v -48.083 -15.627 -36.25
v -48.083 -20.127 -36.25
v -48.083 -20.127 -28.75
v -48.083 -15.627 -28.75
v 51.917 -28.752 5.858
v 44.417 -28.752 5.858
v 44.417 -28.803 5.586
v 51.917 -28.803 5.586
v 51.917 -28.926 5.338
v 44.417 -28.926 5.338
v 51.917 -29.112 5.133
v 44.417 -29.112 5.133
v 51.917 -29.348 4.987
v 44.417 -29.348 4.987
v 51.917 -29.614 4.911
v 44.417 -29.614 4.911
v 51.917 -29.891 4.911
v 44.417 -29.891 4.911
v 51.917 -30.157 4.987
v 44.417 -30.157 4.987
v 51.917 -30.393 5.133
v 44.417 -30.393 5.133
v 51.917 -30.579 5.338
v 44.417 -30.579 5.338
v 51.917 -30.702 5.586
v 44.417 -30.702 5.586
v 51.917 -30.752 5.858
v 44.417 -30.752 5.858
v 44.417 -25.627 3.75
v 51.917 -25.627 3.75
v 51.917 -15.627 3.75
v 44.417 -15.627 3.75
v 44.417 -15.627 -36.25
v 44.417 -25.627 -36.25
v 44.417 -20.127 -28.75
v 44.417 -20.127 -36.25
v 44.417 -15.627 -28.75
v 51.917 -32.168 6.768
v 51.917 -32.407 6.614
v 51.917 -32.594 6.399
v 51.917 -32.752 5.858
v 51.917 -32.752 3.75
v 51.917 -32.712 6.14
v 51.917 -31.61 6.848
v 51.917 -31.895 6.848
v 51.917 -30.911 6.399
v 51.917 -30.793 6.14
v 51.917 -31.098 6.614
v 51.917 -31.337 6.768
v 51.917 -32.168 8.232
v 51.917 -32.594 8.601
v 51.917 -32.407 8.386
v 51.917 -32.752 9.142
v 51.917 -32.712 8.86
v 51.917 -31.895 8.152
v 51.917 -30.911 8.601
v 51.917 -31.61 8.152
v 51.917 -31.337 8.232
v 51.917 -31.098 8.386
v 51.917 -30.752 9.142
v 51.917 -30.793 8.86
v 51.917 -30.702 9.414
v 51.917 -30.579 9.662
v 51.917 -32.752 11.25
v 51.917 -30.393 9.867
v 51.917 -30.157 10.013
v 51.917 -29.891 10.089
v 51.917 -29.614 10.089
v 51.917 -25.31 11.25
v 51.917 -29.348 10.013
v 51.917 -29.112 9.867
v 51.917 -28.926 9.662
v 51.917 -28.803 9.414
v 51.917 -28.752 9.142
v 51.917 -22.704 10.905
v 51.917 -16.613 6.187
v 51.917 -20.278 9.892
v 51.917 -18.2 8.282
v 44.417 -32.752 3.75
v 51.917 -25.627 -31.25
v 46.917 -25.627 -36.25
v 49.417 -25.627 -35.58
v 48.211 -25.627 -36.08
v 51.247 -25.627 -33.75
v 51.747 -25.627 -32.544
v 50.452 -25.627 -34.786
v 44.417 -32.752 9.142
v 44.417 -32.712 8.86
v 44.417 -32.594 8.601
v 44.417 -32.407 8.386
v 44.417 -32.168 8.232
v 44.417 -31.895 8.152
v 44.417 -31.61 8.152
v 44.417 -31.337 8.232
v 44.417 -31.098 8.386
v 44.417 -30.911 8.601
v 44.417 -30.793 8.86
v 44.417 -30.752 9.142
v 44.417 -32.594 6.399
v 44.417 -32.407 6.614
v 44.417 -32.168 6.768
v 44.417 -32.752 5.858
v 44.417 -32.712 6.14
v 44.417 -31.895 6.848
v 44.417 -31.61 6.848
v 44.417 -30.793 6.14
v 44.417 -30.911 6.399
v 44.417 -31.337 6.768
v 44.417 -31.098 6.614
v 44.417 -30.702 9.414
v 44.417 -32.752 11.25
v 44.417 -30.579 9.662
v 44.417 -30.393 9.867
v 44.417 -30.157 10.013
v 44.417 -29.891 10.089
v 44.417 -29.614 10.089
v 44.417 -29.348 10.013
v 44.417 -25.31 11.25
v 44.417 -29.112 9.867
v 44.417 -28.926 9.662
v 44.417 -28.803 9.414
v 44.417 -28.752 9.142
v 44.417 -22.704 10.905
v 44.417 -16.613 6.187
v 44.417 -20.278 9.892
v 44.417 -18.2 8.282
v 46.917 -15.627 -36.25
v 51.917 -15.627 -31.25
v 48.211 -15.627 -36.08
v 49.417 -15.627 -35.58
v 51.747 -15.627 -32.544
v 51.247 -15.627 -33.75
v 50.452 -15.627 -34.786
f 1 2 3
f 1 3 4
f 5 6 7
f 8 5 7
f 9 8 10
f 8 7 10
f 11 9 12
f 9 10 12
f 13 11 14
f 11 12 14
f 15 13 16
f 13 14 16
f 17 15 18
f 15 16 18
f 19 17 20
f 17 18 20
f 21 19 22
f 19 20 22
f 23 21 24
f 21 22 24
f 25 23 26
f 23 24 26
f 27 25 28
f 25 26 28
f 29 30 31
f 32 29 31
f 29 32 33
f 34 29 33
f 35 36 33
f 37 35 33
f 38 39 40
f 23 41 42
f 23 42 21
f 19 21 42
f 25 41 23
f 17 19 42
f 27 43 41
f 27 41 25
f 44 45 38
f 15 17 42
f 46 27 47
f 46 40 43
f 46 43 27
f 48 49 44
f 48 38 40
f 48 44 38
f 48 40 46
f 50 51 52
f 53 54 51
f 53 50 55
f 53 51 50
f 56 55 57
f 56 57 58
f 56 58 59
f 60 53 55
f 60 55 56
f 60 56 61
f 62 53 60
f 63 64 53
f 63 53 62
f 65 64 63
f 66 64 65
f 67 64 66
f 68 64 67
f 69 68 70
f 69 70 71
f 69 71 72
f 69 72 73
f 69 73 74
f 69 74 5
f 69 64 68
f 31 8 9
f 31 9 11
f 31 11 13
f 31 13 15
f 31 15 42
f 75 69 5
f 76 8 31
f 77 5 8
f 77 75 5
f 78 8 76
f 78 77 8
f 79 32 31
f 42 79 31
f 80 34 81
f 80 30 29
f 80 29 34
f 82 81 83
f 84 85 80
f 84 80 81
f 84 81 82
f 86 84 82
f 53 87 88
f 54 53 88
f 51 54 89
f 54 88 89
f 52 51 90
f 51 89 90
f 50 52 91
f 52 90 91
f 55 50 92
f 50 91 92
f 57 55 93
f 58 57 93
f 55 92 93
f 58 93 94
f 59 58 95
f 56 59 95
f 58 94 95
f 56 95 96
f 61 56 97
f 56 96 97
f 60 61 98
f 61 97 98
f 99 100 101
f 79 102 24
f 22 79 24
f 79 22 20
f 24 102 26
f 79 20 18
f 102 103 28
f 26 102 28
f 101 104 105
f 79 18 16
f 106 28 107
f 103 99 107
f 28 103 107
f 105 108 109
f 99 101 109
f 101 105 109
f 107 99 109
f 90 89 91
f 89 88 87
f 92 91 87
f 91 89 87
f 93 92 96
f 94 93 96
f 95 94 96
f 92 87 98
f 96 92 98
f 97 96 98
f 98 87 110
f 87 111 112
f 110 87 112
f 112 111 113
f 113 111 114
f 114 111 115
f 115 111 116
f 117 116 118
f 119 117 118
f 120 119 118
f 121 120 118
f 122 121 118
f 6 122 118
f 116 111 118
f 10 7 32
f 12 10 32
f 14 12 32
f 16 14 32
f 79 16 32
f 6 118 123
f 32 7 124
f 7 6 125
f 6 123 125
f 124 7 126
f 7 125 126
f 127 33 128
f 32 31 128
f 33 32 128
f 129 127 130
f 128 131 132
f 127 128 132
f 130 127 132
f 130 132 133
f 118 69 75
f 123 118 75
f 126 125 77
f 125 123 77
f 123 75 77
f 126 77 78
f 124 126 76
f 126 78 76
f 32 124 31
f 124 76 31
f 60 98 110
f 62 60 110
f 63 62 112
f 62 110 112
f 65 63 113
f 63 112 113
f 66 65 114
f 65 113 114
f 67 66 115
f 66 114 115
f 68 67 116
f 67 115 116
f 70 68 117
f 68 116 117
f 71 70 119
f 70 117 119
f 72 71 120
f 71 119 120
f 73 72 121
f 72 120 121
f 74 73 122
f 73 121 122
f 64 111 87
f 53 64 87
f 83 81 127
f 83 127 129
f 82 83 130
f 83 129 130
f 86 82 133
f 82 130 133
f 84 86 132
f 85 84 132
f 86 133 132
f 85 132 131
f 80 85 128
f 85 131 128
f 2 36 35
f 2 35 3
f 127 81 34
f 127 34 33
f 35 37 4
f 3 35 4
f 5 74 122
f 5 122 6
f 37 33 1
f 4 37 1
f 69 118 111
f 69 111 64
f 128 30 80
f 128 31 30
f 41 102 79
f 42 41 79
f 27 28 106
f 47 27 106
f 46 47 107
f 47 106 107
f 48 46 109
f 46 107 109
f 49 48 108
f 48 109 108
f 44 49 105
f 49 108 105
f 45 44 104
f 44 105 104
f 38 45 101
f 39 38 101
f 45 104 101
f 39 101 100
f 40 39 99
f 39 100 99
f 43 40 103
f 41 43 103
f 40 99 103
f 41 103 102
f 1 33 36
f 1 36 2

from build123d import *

# Parameters (mm, degrees)
PUSHER_BASE_DEPTH   = 15
SKETCH3_R           = 1.95
SCREW_HOLE_DEPTH    = 7.5
SKETCH6_W           = 7.5
SKETCH6_H           = 30.25
PUSHER_HEAD_DEPTH   = 3.75
FILLET1_R           = 2
CUT_EXTRUDE1_DEPTH  = 7.5
SKETCH9_W           = 40
SKETCH9_H           = 10
BOSS_EXTRUDE1_DEPTH = 7.5
SKETCH10_W          = 92.5
SKETCH10_H          = 4.5
BOSS_EXTRUDE2_DEPTH = 7.5
FILLET7_R           = 10
FILLET8_R           = 5
SKETCH13_W          = 41.9274774
SKETCH13_H          = 25.253149212
CUT_EXTRUDE2_DEPTH  = 26


with BuildPart() as part:
    # Sketch1 → pusher base (new body)
    with BuildSketch(Plane.XY):
        Polygon((59.166899441, -45.877477752), (51.666899441, -45.877477752), (44.666899441, -45.877477752), (37.166899441, -45.877477752), (37.166899441, -69.377477752), (41.916899441, -69.377477752), (41.916899441, -64.127477752), (54.416899441, -64.127477752), (54.416899441, -69.377477752), (59.166899441, -69.377477752), align=None)
        with BuildLine():
            Line((48.279417247, -51.877477752), (48.054381634, -51.877477752))
            ThreePointArc((48.054381634, -51.877477752), (39.166899441, -50.877477752), (48.054381634, -49.877477752))
            Line((48.054381634, -49.877477752), (48.279417247, -49.877477752))
            ThreePointArc((48.279417247, -49.877477752), (57.166899441, -50.877477752), (48.279417247, -51.877477752))
        make_face(mode=Mode.SUBTRACT)
    extrude(amount=PUSHER_BASE_DEPTH)

    # Sketch3 → screw hole (cut)
    with BuildSketch(Plane.XZ.offset(64.127477752)):
        with Locations(Location((48.166899441, 7.5, 0), (0, 0, 270))):
            Circle(SKETCH3_R)
    extrude(amount=-SCREW_HOLE_DEPTH, mode=Mode.SUBTRACT)

    # Sketch6 → pusher head (add, symmetric)
    with BuildSketch(Plane.XY.offset(7.5)):
        with Locations((48.166899441, -30.752477752)):
            Rectangle(SKETCH6_W, SKETCH6_H)
    extrude(amount=PUSHER_HEAD_DEPTH, both=True)

    # Fillet1
    # the kernel refuses this fillet: 2 mm, written as the material it takes off along each edge
    with BuildSketch(Plane(origin=(64.166899441, -45.877477752, 0), x_dir=(0, -1, 0), z_dir=(-1, 0, 0)), Plane(origin=(32.166899441, -45.877477752, 15), x_dir=(0, -1, 0), z_dir=(1, 0, 0))) as fillet1_piece_1:
        with BuildLine():
            CenterArc((FILLET1_R, FILLET1_R), FILLET1_R, 180, 90)
            Line((0, FILLET1_R), (0, 0))
            Line((0, 0), (FILLET1_R, 0))
        make_face()
    extrude(amount=32, mode=Mode.SUBTRACT)

    # Sketch12 → Cut-Extrude1 (cut)
    with BuildSketch(Plane.ZY.offset(-44.416899441)):
        with BuildLine():
            ThreePointArc((5.858454214, -30.752477752), (6.858454214, -31.752477752), (5.858454214, -32.752477752))
            Line((5.858454214, -32.752477752), (3.75, -32.752477752))
            Line((3.75, -32.752477752), (3.75, -45.877477752))
            Line((3.75, -45.877477752), (11.25, -45.877477752))
            Line((11.25, -45.877477752), (11.25, -32.752477752))
            Line((11.25, -32.752477752), (9.141545786, -32.752477752))
            ThreePointArc((9.141545786, -32.752477752), (8.141545786, -31.752477752), (9.141545786, -30.752477752))
            ThreePointArc((9.141545786, -30.752477752), (10.09823306, -29.752477752), (9.141545786, -28.752477752))
            Line((9.141545786, -28.752477752), (5.858454214, -28.752477752))
            ThreePointArc((5.858454214, -28.752477752), (4.90176694, -29.752477752), (5.858454214, -30.752477752))
        make_face()
    extrude(amount=-CUT_EXTRUDE1_DEPTH, mode=Mode.SUBTRACT)


with BuildPart() as cut_extrude1_piece_1:
    # of the separate pieces the step leaves, piece 1, a body of its own (cut_extrude1_pieces)
    add(part.part.solids().sort_by_distance((54.416899441, -69.377477752, 0))[0])

    # Sketch13 → Cut-Extrude2 (cut)
    with BuildSketch(Plane(origin=(0, -45.877477752, 0), x_dir=(1, 0, 0), z_dir=(0, 1, 0))):
        with Locations((48.381862236, -7.484888467)):
            Rectangle(SKETCH13_W, SKETCH13_H)
    extrude(amount=-CUT_EXTRUDE2_DEPTH, mode=Mode.SUBTRACT)


with BuildPart() as cut_extrude1_piece_2:
    # of the separate pieces the step leaves, piece 2, a body of its own (cut_extrude1_pieces)
    add(part.part.solids().sort_by_distance((51.916899441, -15.627477752, 3.75))[0])

    # Fillet7
    # the kernel refuses this fillet: 10 mm, written as the material it takes off along each edge
    with BuildSketch(Plane(origin=(76.123045355, -15.627477752, 11.25), x_dir=(0, 0, -1), z_dir=(-1, 0, 0))) as fillet7_piece_1:
        with BuildLine():
            CenterArc((10, 9.682458366), FILLET7_R, 180, 75.522487814)
            Line((0, 9.682458366), (-0.2, 9.682458366))
            Line((-0.2, 9.682458366), (-0.2, 0))
            Line((-0.2, 0), (0, -0.2))
            ThreePointArc((0, -0.2), (3.75, -0.2), (7.45, -0.193649167))
            Line((7.45, -0.193649167), (7.5, 0))
        make_face()
    extrude(amount=55.912291828, mode=Mode.SUBTRACT)


with BuildPart() as body_3:
    # Sketch9 → Boss-Extrude1 (new body)
    with BuildSketch(Plane(origin=(51.916899441, 0, 0), x_dir=(0, 0, -1), z_dir=(1, 0, 0))):
        with Locations((16.25, -20.627477752)):
            Rectangle(SKETCH9_W, SKETCH9_H)
    extrude(amount=-BOSS_EXTRUDE1_DEPTH)

    # Fillet8
    fillet8_edges = [body_3.edges().sort_by_distance(p)[0] for p in [
        (51.916899441, -20.627477752, -36.25),
    ]]
    fillet(fillet8_edges, radius=FILLET8_R)


with BuildPart() as body_4:
    # Sketch10 → Boss-Extrude2 (new body)
    with BuildSketch(Plane(origin=(0, 0, -36.25), x_dir=(-1, 0, 0), z_dir=(0, 0, -1))):
        with Locations((1.833100559, -17.877477752)):
            Rectangle(SKETCH10_W, SKETCH10_H)
    extrude(amount=-BOSS_EXTRUDE2_DEPTH)


solid = Compound([cut_extrude1_piece_2.part, body_3.part, body_4.part])
